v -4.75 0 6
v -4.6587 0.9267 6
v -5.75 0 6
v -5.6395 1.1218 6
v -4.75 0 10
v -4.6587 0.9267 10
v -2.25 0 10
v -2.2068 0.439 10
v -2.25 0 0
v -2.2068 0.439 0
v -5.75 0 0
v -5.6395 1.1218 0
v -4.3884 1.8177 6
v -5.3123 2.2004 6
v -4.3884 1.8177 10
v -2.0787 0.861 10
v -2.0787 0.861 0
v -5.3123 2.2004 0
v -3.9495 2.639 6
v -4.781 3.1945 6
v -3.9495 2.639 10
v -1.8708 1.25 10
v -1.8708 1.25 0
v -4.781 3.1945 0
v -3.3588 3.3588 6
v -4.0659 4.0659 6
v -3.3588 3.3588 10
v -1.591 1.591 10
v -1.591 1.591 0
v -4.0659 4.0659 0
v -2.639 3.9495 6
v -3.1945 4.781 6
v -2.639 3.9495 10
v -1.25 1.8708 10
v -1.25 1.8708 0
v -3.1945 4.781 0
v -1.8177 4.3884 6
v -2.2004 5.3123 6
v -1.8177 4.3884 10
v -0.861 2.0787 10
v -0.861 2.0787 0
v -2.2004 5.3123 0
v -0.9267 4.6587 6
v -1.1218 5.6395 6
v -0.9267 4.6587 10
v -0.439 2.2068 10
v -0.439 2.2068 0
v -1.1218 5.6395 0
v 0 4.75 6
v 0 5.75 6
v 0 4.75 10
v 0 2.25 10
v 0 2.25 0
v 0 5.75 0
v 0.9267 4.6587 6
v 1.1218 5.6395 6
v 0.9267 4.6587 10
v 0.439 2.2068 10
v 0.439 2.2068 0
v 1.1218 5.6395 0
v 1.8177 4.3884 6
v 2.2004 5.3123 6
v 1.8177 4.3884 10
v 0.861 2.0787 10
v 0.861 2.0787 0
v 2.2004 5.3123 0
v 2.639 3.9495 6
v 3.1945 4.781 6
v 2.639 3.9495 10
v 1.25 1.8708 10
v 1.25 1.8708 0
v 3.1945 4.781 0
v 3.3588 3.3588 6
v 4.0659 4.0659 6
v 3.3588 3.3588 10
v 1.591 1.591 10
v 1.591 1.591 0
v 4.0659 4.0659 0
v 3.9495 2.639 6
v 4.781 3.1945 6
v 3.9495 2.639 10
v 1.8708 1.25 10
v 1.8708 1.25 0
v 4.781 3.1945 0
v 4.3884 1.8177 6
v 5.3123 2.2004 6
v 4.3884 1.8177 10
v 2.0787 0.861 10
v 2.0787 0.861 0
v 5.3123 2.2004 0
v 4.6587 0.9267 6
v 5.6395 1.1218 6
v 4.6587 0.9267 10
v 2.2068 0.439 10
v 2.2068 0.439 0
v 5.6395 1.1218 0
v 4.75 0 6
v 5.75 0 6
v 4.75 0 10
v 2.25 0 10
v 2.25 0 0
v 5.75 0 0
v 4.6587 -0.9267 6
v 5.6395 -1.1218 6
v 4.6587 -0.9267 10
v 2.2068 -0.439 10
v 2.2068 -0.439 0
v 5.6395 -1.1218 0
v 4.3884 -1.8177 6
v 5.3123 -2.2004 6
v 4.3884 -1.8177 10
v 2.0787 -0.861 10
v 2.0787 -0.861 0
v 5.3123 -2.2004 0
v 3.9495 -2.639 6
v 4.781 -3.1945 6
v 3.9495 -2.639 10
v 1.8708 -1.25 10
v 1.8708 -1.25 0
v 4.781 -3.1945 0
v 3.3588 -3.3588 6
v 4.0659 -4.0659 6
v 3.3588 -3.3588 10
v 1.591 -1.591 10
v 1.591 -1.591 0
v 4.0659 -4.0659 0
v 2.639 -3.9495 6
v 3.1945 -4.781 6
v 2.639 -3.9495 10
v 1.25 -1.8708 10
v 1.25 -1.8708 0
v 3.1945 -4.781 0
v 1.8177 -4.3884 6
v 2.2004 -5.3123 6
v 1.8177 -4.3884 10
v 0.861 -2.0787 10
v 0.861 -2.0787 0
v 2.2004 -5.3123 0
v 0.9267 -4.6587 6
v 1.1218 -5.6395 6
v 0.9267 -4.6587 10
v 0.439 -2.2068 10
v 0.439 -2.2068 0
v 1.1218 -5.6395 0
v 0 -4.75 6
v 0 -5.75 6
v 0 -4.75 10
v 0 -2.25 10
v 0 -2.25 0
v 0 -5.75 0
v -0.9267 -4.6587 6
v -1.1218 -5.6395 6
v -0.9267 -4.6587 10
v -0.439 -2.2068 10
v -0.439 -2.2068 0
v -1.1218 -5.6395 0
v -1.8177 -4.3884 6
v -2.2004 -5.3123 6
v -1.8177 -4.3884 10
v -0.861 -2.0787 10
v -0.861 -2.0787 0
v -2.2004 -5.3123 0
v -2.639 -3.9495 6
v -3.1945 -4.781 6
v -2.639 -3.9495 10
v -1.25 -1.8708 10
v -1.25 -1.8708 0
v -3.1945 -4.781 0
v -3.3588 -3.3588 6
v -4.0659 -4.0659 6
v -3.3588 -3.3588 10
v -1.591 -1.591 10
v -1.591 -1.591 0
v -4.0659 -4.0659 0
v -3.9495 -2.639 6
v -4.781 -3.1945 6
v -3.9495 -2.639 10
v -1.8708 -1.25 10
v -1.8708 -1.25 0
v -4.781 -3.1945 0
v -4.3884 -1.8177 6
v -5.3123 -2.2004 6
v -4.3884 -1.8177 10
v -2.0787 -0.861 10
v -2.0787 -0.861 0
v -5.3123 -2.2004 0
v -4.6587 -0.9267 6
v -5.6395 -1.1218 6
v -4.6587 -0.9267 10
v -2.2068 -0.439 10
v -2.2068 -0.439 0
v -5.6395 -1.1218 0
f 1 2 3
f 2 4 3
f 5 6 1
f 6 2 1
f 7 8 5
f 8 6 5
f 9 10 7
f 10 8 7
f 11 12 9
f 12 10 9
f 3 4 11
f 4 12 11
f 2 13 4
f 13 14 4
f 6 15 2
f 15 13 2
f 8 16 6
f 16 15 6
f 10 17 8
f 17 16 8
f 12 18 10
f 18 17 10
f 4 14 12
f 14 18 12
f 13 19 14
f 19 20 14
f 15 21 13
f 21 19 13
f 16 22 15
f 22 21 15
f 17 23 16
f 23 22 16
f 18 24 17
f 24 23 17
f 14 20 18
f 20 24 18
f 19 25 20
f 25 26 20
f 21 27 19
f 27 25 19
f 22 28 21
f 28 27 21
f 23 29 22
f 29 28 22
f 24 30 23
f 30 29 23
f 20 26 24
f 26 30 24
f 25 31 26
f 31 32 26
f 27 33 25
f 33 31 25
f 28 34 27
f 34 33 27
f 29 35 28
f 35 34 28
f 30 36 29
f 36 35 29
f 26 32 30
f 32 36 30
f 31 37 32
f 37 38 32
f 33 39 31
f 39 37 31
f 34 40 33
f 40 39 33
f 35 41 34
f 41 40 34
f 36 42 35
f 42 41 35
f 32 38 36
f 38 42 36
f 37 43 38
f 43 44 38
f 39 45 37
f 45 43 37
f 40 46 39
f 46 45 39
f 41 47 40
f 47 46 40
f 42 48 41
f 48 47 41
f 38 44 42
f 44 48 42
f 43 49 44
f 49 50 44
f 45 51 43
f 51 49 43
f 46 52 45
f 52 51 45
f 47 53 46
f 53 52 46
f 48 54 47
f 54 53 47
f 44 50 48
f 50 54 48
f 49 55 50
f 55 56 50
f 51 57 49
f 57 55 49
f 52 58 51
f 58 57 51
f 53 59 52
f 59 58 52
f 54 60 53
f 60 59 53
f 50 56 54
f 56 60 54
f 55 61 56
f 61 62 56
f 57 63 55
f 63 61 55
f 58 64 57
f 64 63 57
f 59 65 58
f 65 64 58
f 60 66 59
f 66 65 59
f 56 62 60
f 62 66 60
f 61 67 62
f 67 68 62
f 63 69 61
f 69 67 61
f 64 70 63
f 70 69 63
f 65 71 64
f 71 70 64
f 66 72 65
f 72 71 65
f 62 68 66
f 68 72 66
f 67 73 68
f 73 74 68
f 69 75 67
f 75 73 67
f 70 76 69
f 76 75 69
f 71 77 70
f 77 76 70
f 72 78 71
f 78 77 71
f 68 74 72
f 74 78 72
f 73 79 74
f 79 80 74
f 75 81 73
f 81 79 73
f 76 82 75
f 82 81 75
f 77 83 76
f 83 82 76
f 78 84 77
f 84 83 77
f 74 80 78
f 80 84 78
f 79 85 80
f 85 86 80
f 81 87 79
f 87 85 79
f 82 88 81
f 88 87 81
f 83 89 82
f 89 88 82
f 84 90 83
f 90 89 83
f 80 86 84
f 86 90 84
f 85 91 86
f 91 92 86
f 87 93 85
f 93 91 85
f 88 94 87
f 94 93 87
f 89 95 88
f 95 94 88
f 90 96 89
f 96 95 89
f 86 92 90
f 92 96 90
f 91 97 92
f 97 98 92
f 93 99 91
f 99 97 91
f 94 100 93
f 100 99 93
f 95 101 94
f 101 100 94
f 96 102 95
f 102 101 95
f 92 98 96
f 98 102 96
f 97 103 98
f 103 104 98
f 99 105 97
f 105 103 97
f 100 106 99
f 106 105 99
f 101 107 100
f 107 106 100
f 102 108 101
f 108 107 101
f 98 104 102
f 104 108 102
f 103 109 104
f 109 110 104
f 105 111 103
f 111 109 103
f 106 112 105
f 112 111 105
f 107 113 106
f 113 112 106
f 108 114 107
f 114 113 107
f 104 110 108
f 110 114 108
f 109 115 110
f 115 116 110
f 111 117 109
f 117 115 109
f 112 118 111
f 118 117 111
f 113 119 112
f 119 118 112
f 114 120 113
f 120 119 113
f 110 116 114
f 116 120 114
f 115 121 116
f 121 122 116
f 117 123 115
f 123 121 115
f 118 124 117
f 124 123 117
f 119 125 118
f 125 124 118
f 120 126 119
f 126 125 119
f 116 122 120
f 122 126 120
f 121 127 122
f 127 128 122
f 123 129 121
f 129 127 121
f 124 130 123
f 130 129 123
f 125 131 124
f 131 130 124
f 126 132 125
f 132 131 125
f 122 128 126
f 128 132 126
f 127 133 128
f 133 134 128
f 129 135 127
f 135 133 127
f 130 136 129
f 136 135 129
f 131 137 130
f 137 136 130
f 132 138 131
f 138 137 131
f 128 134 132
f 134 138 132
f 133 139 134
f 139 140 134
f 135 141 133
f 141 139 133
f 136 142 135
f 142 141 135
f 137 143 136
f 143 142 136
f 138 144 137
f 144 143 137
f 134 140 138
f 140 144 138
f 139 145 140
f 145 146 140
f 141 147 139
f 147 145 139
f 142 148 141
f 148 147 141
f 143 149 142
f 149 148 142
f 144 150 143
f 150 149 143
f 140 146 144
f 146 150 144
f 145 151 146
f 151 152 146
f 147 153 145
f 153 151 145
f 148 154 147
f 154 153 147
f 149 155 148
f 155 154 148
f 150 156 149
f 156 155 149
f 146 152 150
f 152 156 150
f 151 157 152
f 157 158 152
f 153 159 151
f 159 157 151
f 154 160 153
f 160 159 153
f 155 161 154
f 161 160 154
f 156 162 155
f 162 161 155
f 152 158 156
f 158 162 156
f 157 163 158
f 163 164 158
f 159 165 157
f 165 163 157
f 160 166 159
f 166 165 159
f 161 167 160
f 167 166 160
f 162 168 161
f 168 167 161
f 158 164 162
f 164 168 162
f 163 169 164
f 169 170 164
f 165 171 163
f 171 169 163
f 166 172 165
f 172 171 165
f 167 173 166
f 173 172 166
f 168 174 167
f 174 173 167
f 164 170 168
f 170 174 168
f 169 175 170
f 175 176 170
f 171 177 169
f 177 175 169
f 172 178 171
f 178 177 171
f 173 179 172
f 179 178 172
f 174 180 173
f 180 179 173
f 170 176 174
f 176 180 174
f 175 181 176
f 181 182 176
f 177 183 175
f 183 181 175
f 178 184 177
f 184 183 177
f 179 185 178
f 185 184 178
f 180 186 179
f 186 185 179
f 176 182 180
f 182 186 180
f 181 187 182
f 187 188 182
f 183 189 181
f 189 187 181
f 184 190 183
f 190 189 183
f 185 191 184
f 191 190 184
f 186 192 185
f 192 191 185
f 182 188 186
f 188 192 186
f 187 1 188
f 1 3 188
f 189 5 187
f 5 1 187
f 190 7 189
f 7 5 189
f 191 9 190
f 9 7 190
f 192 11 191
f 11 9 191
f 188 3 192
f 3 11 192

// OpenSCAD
$fn = 32;

// ----------------------------------------------------------------------
// Form washer: stepped_c washer, 11.5 mm outside, 4.5 mm bore
// ----------------------------------------------------------------------

// --- parameters (mm) ---
revolve_angle = 360;      // full turn around the Z axis
profile_points = 6;       // points of the closed outline

profile = [[2.25, 0], [5.75, 0], [5.75, 6], [4.75, 6], [4.75, 10], [2.25, 10]];  // single closed polygon, 6 points, counter clockwise

// --- the one profile operation ---
rotate_extrude(angle = revolve_angle) polygon(points = profile);
